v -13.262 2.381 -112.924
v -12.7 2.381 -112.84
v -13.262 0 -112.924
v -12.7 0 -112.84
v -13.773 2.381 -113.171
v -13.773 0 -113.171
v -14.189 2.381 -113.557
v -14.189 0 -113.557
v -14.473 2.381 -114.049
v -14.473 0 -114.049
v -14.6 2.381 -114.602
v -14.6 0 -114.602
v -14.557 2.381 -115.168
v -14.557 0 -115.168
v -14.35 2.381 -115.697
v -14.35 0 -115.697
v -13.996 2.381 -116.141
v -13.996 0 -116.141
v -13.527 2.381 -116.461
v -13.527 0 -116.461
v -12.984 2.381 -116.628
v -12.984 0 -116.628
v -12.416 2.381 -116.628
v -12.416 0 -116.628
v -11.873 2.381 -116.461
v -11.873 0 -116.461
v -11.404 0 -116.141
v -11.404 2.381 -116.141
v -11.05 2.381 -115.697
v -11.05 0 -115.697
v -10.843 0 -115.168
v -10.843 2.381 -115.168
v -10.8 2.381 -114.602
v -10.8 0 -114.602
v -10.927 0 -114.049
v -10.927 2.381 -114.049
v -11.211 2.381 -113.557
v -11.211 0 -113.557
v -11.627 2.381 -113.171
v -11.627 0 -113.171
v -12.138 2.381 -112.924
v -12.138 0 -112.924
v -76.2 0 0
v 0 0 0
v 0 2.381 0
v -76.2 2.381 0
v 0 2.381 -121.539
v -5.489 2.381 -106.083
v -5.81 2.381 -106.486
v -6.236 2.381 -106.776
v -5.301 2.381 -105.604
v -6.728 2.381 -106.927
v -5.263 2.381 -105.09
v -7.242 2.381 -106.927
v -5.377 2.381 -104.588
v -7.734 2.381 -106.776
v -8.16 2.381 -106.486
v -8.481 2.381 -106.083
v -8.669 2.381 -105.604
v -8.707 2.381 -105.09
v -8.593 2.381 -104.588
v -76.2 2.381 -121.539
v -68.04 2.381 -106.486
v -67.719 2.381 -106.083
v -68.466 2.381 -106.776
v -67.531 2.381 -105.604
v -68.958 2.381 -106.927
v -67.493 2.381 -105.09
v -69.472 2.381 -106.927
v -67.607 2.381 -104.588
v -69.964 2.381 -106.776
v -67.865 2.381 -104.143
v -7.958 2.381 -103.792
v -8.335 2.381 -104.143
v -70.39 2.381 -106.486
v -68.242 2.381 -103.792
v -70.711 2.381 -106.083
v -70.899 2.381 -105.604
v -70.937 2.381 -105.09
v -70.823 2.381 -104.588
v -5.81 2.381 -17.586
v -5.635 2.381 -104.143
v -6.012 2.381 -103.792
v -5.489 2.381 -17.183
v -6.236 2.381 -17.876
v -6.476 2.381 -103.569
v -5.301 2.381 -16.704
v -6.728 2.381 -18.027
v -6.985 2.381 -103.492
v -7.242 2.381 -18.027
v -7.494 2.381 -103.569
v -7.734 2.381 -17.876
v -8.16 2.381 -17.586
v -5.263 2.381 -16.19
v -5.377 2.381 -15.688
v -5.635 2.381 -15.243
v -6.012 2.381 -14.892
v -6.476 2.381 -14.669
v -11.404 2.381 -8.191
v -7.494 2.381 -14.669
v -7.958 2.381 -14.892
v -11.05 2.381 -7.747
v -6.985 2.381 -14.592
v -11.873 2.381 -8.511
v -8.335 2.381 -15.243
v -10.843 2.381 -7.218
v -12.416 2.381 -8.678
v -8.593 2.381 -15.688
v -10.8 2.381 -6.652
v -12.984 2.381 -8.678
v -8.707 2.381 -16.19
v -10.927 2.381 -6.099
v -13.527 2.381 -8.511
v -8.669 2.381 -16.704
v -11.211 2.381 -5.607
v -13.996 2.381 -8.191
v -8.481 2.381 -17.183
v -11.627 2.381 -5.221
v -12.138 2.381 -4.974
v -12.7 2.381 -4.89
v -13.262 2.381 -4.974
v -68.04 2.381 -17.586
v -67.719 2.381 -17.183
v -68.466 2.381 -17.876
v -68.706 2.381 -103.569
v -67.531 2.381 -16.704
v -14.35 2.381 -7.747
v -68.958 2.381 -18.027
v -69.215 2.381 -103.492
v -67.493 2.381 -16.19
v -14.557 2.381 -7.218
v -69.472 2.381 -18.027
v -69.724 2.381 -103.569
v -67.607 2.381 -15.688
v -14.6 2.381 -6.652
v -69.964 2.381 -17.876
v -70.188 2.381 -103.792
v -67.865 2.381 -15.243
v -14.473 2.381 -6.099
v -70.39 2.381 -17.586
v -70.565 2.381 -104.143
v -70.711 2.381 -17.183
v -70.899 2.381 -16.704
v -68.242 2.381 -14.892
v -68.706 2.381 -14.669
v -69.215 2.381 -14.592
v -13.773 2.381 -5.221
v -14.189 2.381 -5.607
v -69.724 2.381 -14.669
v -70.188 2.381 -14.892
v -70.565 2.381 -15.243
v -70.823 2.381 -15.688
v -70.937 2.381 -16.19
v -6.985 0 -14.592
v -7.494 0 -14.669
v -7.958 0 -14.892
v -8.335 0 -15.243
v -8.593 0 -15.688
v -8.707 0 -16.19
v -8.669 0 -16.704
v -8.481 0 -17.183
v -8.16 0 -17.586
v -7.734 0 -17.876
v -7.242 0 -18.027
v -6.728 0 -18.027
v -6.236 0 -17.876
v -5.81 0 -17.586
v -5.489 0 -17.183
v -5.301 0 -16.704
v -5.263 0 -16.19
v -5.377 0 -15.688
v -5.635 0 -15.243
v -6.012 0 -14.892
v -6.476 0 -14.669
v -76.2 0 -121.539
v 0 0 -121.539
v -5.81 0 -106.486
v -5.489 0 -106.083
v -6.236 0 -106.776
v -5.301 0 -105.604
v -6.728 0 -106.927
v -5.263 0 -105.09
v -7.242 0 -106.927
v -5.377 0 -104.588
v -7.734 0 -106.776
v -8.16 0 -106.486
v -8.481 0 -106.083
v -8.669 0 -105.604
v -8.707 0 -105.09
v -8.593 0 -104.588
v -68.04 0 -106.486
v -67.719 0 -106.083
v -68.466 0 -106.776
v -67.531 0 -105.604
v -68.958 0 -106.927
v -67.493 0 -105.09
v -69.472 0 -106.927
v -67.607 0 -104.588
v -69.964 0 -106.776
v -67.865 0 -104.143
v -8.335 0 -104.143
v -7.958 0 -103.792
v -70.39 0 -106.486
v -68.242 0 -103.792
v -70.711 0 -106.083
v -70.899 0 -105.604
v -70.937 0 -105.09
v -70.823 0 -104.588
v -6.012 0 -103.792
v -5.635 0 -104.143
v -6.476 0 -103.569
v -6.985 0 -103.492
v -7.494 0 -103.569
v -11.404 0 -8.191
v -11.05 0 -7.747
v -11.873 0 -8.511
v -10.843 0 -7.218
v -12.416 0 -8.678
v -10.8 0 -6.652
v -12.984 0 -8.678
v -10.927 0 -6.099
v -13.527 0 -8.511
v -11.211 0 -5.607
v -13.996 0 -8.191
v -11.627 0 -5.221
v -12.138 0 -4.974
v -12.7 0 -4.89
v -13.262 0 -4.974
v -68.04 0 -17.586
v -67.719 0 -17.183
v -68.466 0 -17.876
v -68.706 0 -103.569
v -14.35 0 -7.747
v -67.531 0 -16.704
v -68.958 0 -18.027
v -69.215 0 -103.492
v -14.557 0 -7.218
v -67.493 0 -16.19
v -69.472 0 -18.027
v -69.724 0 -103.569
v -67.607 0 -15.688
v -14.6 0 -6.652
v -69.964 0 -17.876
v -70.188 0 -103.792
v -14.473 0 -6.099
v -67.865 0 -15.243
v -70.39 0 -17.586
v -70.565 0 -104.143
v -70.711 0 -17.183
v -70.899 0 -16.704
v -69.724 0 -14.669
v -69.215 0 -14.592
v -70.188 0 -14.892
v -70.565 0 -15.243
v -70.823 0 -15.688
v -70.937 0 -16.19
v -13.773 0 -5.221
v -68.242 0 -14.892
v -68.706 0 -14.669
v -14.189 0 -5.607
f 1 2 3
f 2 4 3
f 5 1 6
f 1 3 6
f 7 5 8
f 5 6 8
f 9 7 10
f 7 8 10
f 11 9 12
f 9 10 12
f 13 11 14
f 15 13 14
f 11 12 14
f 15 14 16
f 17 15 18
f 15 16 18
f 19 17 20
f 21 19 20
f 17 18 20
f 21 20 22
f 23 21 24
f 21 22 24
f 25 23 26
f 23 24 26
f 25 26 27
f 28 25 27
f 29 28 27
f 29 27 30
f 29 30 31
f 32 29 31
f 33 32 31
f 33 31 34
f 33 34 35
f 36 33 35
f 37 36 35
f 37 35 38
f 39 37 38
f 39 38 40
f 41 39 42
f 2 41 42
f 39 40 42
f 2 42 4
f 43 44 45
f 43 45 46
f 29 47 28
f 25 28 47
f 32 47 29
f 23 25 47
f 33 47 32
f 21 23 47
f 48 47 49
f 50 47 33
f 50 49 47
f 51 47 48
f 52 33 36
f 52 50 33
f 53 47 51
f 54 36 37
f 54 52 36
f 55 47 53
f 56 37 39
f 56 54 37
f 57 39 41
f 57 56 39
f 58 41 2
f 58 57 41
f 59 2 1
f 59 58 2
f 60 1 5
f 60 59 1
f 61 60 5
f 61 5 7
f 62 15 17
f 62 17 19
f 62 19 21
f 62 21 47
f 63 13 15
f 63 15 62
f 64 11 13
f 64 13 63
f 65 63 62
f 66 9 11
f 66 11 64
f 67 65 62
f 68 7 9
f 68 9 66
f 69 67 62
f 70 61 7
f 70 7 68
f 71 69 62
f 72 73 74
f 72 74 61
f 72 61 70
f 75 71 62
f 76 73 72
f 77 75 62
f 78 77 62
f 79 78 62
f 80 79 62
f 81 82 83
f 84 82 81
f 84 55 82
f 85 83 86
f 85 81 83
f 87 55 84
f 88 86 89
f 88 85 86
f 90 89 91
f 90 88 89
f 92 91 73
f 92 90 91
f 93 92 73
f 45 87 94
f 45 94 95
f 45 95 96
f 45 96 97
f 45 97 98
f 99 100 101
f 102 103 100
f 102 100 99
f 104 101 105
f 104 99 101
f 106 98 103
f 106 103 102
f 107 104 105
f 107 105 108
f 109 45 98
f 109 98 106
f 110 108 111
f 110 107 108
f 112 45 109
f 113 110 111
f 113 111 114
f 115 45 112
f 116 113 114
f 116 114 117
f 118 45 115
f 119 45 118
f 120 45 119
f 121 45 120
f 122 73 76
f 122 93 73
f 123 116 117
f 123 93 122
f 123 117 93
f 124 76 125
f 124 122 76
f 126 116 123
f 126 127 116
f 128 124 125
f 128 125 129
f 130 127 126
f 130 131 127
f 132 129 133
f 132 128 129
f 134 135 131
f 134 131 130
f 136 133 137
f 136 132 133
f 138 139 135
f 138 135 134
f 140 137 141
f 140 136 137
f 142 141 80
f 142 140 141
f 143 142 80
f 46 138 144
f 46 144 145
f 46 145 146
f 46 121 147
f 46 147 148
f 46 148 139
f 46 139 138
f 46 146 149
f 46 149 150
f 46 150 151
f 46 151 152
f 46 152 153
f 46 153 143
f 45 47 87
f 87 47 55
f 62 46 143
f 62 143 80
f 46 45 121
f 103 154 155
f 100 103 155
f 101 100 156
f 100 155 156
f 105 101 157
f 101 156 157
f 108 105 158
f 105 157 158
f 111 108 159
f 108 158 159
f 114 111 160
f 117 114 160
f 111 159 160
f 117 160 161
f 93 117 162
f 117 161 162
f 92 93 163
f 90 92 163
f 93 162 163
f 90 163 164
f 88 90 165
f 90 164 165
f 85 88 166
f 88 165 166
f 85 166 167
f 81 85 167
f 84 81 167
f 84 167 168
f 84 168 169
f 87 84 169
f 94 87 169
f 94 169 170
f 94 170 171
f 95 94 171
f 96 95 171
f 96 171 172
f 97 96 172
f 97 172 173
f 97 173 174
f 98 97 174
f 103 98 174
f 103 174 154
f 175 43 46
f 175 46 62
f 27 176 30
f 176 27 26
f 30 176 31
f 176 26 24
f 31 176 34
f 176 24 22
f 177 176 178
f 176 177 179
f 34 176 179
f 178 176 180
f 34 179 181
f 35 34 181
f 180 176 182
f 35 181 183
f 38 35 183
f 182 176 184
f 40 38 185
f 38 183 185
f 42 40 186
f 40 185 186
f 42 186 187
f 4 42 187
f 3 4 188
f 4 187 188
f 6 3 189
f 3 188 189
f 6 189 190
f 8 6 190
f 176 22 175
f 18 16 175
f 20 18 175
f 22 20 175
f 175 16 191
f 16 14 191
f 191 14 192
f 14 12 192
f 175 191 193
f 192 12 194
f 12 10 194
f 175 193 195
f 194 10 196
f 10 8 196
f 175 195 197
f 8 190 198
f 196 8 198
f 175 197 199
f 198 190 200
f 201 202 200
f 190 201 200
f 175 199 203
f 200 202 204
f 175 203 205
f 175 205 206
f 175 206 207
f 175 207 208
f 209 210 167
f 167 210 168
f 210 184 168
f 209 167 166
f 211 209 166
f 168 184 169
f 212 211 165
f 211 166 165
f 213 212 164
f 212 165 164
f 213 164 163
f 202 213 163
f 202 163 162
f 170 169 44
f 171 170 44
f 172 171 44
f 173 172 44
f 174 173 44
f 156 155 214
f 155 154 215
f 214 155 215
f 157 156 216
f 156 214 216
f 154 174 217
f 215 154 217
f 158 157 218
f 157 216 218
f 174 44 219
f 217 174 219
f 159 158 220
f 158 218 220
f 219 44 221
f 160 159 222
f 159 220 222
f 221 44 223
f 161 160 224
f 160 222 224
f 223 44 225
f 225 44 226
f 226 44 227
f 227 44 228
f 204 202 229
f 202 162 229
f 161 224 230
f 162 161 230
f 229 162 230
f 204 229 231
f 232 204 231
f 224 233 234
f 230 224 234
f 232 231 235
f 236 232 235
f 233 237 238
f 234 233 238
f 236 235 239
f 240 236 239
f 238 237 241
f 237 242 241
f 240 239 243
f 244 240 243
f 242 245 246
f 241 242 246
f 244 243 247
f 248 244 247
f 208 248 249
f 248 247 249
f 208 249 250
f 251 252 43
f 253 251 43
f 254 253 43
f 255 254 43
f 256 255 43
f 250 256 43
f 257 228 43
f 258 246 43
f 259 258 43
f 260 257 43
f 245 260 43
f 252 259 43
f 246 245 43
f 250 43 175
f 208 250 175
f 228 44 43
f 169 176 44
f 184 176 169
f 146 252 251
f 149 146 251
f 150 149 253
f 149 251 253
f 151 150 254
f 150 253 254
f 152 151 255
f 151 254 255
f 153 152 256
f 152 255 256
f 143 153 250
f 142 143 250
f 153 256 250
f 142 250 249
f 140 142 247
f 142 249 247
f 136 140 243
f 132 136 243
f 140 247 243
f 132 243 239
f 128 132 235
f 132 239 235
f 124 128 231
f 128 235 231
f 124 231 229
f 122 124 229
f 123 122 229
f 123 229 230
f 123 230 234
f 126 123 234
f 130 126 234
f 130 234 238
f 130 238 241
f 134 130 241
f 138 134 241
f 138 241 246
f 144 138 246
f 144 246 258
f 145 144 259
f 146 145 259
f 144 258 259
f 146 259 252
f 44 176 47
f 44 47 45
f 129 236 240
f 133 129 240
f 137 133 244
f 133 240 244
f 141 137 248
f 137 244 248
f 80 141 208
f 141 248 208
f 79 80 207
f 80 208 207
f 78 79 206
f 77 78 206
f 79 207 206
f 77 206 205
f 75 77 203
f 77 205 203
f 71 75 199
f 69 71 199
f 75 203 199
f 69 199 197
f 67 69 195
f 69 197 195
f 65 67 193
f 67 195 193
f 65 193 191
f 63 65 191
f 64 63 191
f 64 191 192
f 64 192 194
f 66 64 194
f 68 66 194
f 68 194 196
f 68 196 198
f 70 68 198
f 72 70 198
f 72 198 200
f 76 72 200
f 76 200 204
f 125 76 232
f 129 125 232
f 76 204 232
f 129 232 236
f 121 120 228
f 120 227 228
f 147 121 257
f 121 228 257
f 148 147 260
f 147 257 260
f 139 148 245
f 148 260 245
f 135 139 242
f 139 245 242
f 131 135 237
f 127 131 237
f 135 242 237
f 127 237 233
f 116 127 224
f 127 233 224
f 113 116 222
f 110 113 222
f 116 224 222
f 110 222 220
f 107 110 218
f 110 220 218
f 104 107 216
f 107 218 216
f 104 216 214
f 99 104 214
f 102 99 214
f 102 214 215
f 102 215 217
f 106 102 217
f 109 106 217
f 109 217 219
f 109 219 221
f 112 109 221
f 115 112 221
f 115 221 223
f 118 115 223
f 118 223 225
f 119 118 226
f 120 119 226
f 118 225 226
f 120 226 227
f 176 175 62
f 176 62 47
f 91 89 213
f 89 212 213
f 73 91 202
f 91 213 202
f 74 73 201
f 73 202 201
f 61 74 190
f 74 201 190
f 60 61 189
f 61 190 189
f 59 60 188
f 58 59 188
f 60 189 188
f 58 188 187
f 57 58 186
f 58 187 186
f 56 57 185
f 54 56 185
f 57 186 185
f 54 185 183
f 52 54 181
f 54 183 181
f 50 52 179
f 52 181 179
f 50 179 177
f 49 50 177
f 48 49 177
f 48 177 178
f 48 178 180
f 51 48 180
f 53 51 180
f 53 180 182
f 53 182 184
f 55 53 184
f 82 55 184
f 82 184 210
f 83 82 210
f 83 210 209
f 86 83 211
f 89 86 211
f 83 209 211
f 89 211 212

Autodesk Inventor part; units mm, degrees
ref_plane "YZ Plane" through (0, 0, 0) normal (1, 0, 0) x (0, 1, 0)
ref_plane "XZ Plane" through (0, 0, 0) normal (0, 1, 0) x (-1, 0, 0)
ref_plane "XY Plane" through (0, 0, 0) normal (0, 0, 1) x (1, 0, 0)
sketch "Sketch1" plane through (0, 0, 0) normal (0, 1, 0) x (-1, 0, 0)
  line L0 (0, 0) -> (76.2, 0)
  line L1 (76.2, 0) -> (76.2, -121.539)
  line L2 (76.2, -121.539) -> (0, -121.539)
  line L3 (0, -121.539) -> (0, 0)
  dimension "d0" = 76.2
  dimension "d1" = 121.539
extrude "Extrusion1" add sketch "Sketch1" along normal blind 2.3813
sketch "Sketch2" plane through (0, 2.3813, 0) normal (0, 1, 0) x (1, 0, 0)
  line L0 (-6.985, -6.7053) -> (-6.985, 140.88) construction
  line L1 (-69.215, -6.7053) -> (-69.215, 134.4303) construction
  line L2 (-84.4429, 16.3195) -> (15.1684, 16.3195) construction
  line L3 (-82.9542, 105.2195) -> (32.716, 105.2195) construction
  line L4 (-85.3039, 60.7695) -> (24.2122, 60.7695) construction
  line L5 (-38.1, -11.6346) -> (-38.1, 148.7845) construction
  line L6 (-76.2, 121.539) -> (-76.2, 0) construction
  line L7 (-76.2, 0) -> (0, 0) construction
  point P0 (-76.2, 60.7695)
  point P1 (-38.1, 0)
  point P2 (-69.215, 16.3195)
  point P3 (-6.985, 16.3195)
  point P4 (-6.985, 105.2195)
  point P5 (-69.215, 105.2195)
  dimension "d4" = 88.9
  dimension "d5" = 62.23
hole "Hole1" at (-69.215, 2.3813, -16.3195) at (-6.985, 2.3813, -16.3195) at (-6.985, 2.3813, -105.2195) at (-69.215, 2.3813, -105.2195) direction (0, -1, 0) diameter 3.4544 depth 25.4 tip angle 118 clearance for "Flat Head Machine Screw (82)" size "#5" standard "Ansi Unified Screw Threads"
sketch "Sketch3" plane through (0, 2.3813, 0) normal (0, 1, 0) x (1, 0, 0)
  line L0 (-12.7, -7.2404) -> (-12.7, 131.1471) construction
  line L1 (0, 0) -> (0, 121.539) construction
  line L2 (-88.3446, 60.7695) -> (40.5312, 60.7695) construction
  point P0 (-12.7, 6.7945)
  point P1 (-12.7, 114.7445)
  point P2 (0, 60.7695)
  dimension "d13" = 12.7
  dimension "d14" = 107.95
hole "Hole2" at (-12.7, 2.3813, -6.7945) at (-12.7, 2.3813, -114.7445) direction (0, -1, 0) diameter 3.81 depth 25.4 tip angle 118 clearance for "Flat Head Machine Screw (82)" size "#6" standard "Ansi Unified Screw Threads"
properties part number "redboard_plate"
